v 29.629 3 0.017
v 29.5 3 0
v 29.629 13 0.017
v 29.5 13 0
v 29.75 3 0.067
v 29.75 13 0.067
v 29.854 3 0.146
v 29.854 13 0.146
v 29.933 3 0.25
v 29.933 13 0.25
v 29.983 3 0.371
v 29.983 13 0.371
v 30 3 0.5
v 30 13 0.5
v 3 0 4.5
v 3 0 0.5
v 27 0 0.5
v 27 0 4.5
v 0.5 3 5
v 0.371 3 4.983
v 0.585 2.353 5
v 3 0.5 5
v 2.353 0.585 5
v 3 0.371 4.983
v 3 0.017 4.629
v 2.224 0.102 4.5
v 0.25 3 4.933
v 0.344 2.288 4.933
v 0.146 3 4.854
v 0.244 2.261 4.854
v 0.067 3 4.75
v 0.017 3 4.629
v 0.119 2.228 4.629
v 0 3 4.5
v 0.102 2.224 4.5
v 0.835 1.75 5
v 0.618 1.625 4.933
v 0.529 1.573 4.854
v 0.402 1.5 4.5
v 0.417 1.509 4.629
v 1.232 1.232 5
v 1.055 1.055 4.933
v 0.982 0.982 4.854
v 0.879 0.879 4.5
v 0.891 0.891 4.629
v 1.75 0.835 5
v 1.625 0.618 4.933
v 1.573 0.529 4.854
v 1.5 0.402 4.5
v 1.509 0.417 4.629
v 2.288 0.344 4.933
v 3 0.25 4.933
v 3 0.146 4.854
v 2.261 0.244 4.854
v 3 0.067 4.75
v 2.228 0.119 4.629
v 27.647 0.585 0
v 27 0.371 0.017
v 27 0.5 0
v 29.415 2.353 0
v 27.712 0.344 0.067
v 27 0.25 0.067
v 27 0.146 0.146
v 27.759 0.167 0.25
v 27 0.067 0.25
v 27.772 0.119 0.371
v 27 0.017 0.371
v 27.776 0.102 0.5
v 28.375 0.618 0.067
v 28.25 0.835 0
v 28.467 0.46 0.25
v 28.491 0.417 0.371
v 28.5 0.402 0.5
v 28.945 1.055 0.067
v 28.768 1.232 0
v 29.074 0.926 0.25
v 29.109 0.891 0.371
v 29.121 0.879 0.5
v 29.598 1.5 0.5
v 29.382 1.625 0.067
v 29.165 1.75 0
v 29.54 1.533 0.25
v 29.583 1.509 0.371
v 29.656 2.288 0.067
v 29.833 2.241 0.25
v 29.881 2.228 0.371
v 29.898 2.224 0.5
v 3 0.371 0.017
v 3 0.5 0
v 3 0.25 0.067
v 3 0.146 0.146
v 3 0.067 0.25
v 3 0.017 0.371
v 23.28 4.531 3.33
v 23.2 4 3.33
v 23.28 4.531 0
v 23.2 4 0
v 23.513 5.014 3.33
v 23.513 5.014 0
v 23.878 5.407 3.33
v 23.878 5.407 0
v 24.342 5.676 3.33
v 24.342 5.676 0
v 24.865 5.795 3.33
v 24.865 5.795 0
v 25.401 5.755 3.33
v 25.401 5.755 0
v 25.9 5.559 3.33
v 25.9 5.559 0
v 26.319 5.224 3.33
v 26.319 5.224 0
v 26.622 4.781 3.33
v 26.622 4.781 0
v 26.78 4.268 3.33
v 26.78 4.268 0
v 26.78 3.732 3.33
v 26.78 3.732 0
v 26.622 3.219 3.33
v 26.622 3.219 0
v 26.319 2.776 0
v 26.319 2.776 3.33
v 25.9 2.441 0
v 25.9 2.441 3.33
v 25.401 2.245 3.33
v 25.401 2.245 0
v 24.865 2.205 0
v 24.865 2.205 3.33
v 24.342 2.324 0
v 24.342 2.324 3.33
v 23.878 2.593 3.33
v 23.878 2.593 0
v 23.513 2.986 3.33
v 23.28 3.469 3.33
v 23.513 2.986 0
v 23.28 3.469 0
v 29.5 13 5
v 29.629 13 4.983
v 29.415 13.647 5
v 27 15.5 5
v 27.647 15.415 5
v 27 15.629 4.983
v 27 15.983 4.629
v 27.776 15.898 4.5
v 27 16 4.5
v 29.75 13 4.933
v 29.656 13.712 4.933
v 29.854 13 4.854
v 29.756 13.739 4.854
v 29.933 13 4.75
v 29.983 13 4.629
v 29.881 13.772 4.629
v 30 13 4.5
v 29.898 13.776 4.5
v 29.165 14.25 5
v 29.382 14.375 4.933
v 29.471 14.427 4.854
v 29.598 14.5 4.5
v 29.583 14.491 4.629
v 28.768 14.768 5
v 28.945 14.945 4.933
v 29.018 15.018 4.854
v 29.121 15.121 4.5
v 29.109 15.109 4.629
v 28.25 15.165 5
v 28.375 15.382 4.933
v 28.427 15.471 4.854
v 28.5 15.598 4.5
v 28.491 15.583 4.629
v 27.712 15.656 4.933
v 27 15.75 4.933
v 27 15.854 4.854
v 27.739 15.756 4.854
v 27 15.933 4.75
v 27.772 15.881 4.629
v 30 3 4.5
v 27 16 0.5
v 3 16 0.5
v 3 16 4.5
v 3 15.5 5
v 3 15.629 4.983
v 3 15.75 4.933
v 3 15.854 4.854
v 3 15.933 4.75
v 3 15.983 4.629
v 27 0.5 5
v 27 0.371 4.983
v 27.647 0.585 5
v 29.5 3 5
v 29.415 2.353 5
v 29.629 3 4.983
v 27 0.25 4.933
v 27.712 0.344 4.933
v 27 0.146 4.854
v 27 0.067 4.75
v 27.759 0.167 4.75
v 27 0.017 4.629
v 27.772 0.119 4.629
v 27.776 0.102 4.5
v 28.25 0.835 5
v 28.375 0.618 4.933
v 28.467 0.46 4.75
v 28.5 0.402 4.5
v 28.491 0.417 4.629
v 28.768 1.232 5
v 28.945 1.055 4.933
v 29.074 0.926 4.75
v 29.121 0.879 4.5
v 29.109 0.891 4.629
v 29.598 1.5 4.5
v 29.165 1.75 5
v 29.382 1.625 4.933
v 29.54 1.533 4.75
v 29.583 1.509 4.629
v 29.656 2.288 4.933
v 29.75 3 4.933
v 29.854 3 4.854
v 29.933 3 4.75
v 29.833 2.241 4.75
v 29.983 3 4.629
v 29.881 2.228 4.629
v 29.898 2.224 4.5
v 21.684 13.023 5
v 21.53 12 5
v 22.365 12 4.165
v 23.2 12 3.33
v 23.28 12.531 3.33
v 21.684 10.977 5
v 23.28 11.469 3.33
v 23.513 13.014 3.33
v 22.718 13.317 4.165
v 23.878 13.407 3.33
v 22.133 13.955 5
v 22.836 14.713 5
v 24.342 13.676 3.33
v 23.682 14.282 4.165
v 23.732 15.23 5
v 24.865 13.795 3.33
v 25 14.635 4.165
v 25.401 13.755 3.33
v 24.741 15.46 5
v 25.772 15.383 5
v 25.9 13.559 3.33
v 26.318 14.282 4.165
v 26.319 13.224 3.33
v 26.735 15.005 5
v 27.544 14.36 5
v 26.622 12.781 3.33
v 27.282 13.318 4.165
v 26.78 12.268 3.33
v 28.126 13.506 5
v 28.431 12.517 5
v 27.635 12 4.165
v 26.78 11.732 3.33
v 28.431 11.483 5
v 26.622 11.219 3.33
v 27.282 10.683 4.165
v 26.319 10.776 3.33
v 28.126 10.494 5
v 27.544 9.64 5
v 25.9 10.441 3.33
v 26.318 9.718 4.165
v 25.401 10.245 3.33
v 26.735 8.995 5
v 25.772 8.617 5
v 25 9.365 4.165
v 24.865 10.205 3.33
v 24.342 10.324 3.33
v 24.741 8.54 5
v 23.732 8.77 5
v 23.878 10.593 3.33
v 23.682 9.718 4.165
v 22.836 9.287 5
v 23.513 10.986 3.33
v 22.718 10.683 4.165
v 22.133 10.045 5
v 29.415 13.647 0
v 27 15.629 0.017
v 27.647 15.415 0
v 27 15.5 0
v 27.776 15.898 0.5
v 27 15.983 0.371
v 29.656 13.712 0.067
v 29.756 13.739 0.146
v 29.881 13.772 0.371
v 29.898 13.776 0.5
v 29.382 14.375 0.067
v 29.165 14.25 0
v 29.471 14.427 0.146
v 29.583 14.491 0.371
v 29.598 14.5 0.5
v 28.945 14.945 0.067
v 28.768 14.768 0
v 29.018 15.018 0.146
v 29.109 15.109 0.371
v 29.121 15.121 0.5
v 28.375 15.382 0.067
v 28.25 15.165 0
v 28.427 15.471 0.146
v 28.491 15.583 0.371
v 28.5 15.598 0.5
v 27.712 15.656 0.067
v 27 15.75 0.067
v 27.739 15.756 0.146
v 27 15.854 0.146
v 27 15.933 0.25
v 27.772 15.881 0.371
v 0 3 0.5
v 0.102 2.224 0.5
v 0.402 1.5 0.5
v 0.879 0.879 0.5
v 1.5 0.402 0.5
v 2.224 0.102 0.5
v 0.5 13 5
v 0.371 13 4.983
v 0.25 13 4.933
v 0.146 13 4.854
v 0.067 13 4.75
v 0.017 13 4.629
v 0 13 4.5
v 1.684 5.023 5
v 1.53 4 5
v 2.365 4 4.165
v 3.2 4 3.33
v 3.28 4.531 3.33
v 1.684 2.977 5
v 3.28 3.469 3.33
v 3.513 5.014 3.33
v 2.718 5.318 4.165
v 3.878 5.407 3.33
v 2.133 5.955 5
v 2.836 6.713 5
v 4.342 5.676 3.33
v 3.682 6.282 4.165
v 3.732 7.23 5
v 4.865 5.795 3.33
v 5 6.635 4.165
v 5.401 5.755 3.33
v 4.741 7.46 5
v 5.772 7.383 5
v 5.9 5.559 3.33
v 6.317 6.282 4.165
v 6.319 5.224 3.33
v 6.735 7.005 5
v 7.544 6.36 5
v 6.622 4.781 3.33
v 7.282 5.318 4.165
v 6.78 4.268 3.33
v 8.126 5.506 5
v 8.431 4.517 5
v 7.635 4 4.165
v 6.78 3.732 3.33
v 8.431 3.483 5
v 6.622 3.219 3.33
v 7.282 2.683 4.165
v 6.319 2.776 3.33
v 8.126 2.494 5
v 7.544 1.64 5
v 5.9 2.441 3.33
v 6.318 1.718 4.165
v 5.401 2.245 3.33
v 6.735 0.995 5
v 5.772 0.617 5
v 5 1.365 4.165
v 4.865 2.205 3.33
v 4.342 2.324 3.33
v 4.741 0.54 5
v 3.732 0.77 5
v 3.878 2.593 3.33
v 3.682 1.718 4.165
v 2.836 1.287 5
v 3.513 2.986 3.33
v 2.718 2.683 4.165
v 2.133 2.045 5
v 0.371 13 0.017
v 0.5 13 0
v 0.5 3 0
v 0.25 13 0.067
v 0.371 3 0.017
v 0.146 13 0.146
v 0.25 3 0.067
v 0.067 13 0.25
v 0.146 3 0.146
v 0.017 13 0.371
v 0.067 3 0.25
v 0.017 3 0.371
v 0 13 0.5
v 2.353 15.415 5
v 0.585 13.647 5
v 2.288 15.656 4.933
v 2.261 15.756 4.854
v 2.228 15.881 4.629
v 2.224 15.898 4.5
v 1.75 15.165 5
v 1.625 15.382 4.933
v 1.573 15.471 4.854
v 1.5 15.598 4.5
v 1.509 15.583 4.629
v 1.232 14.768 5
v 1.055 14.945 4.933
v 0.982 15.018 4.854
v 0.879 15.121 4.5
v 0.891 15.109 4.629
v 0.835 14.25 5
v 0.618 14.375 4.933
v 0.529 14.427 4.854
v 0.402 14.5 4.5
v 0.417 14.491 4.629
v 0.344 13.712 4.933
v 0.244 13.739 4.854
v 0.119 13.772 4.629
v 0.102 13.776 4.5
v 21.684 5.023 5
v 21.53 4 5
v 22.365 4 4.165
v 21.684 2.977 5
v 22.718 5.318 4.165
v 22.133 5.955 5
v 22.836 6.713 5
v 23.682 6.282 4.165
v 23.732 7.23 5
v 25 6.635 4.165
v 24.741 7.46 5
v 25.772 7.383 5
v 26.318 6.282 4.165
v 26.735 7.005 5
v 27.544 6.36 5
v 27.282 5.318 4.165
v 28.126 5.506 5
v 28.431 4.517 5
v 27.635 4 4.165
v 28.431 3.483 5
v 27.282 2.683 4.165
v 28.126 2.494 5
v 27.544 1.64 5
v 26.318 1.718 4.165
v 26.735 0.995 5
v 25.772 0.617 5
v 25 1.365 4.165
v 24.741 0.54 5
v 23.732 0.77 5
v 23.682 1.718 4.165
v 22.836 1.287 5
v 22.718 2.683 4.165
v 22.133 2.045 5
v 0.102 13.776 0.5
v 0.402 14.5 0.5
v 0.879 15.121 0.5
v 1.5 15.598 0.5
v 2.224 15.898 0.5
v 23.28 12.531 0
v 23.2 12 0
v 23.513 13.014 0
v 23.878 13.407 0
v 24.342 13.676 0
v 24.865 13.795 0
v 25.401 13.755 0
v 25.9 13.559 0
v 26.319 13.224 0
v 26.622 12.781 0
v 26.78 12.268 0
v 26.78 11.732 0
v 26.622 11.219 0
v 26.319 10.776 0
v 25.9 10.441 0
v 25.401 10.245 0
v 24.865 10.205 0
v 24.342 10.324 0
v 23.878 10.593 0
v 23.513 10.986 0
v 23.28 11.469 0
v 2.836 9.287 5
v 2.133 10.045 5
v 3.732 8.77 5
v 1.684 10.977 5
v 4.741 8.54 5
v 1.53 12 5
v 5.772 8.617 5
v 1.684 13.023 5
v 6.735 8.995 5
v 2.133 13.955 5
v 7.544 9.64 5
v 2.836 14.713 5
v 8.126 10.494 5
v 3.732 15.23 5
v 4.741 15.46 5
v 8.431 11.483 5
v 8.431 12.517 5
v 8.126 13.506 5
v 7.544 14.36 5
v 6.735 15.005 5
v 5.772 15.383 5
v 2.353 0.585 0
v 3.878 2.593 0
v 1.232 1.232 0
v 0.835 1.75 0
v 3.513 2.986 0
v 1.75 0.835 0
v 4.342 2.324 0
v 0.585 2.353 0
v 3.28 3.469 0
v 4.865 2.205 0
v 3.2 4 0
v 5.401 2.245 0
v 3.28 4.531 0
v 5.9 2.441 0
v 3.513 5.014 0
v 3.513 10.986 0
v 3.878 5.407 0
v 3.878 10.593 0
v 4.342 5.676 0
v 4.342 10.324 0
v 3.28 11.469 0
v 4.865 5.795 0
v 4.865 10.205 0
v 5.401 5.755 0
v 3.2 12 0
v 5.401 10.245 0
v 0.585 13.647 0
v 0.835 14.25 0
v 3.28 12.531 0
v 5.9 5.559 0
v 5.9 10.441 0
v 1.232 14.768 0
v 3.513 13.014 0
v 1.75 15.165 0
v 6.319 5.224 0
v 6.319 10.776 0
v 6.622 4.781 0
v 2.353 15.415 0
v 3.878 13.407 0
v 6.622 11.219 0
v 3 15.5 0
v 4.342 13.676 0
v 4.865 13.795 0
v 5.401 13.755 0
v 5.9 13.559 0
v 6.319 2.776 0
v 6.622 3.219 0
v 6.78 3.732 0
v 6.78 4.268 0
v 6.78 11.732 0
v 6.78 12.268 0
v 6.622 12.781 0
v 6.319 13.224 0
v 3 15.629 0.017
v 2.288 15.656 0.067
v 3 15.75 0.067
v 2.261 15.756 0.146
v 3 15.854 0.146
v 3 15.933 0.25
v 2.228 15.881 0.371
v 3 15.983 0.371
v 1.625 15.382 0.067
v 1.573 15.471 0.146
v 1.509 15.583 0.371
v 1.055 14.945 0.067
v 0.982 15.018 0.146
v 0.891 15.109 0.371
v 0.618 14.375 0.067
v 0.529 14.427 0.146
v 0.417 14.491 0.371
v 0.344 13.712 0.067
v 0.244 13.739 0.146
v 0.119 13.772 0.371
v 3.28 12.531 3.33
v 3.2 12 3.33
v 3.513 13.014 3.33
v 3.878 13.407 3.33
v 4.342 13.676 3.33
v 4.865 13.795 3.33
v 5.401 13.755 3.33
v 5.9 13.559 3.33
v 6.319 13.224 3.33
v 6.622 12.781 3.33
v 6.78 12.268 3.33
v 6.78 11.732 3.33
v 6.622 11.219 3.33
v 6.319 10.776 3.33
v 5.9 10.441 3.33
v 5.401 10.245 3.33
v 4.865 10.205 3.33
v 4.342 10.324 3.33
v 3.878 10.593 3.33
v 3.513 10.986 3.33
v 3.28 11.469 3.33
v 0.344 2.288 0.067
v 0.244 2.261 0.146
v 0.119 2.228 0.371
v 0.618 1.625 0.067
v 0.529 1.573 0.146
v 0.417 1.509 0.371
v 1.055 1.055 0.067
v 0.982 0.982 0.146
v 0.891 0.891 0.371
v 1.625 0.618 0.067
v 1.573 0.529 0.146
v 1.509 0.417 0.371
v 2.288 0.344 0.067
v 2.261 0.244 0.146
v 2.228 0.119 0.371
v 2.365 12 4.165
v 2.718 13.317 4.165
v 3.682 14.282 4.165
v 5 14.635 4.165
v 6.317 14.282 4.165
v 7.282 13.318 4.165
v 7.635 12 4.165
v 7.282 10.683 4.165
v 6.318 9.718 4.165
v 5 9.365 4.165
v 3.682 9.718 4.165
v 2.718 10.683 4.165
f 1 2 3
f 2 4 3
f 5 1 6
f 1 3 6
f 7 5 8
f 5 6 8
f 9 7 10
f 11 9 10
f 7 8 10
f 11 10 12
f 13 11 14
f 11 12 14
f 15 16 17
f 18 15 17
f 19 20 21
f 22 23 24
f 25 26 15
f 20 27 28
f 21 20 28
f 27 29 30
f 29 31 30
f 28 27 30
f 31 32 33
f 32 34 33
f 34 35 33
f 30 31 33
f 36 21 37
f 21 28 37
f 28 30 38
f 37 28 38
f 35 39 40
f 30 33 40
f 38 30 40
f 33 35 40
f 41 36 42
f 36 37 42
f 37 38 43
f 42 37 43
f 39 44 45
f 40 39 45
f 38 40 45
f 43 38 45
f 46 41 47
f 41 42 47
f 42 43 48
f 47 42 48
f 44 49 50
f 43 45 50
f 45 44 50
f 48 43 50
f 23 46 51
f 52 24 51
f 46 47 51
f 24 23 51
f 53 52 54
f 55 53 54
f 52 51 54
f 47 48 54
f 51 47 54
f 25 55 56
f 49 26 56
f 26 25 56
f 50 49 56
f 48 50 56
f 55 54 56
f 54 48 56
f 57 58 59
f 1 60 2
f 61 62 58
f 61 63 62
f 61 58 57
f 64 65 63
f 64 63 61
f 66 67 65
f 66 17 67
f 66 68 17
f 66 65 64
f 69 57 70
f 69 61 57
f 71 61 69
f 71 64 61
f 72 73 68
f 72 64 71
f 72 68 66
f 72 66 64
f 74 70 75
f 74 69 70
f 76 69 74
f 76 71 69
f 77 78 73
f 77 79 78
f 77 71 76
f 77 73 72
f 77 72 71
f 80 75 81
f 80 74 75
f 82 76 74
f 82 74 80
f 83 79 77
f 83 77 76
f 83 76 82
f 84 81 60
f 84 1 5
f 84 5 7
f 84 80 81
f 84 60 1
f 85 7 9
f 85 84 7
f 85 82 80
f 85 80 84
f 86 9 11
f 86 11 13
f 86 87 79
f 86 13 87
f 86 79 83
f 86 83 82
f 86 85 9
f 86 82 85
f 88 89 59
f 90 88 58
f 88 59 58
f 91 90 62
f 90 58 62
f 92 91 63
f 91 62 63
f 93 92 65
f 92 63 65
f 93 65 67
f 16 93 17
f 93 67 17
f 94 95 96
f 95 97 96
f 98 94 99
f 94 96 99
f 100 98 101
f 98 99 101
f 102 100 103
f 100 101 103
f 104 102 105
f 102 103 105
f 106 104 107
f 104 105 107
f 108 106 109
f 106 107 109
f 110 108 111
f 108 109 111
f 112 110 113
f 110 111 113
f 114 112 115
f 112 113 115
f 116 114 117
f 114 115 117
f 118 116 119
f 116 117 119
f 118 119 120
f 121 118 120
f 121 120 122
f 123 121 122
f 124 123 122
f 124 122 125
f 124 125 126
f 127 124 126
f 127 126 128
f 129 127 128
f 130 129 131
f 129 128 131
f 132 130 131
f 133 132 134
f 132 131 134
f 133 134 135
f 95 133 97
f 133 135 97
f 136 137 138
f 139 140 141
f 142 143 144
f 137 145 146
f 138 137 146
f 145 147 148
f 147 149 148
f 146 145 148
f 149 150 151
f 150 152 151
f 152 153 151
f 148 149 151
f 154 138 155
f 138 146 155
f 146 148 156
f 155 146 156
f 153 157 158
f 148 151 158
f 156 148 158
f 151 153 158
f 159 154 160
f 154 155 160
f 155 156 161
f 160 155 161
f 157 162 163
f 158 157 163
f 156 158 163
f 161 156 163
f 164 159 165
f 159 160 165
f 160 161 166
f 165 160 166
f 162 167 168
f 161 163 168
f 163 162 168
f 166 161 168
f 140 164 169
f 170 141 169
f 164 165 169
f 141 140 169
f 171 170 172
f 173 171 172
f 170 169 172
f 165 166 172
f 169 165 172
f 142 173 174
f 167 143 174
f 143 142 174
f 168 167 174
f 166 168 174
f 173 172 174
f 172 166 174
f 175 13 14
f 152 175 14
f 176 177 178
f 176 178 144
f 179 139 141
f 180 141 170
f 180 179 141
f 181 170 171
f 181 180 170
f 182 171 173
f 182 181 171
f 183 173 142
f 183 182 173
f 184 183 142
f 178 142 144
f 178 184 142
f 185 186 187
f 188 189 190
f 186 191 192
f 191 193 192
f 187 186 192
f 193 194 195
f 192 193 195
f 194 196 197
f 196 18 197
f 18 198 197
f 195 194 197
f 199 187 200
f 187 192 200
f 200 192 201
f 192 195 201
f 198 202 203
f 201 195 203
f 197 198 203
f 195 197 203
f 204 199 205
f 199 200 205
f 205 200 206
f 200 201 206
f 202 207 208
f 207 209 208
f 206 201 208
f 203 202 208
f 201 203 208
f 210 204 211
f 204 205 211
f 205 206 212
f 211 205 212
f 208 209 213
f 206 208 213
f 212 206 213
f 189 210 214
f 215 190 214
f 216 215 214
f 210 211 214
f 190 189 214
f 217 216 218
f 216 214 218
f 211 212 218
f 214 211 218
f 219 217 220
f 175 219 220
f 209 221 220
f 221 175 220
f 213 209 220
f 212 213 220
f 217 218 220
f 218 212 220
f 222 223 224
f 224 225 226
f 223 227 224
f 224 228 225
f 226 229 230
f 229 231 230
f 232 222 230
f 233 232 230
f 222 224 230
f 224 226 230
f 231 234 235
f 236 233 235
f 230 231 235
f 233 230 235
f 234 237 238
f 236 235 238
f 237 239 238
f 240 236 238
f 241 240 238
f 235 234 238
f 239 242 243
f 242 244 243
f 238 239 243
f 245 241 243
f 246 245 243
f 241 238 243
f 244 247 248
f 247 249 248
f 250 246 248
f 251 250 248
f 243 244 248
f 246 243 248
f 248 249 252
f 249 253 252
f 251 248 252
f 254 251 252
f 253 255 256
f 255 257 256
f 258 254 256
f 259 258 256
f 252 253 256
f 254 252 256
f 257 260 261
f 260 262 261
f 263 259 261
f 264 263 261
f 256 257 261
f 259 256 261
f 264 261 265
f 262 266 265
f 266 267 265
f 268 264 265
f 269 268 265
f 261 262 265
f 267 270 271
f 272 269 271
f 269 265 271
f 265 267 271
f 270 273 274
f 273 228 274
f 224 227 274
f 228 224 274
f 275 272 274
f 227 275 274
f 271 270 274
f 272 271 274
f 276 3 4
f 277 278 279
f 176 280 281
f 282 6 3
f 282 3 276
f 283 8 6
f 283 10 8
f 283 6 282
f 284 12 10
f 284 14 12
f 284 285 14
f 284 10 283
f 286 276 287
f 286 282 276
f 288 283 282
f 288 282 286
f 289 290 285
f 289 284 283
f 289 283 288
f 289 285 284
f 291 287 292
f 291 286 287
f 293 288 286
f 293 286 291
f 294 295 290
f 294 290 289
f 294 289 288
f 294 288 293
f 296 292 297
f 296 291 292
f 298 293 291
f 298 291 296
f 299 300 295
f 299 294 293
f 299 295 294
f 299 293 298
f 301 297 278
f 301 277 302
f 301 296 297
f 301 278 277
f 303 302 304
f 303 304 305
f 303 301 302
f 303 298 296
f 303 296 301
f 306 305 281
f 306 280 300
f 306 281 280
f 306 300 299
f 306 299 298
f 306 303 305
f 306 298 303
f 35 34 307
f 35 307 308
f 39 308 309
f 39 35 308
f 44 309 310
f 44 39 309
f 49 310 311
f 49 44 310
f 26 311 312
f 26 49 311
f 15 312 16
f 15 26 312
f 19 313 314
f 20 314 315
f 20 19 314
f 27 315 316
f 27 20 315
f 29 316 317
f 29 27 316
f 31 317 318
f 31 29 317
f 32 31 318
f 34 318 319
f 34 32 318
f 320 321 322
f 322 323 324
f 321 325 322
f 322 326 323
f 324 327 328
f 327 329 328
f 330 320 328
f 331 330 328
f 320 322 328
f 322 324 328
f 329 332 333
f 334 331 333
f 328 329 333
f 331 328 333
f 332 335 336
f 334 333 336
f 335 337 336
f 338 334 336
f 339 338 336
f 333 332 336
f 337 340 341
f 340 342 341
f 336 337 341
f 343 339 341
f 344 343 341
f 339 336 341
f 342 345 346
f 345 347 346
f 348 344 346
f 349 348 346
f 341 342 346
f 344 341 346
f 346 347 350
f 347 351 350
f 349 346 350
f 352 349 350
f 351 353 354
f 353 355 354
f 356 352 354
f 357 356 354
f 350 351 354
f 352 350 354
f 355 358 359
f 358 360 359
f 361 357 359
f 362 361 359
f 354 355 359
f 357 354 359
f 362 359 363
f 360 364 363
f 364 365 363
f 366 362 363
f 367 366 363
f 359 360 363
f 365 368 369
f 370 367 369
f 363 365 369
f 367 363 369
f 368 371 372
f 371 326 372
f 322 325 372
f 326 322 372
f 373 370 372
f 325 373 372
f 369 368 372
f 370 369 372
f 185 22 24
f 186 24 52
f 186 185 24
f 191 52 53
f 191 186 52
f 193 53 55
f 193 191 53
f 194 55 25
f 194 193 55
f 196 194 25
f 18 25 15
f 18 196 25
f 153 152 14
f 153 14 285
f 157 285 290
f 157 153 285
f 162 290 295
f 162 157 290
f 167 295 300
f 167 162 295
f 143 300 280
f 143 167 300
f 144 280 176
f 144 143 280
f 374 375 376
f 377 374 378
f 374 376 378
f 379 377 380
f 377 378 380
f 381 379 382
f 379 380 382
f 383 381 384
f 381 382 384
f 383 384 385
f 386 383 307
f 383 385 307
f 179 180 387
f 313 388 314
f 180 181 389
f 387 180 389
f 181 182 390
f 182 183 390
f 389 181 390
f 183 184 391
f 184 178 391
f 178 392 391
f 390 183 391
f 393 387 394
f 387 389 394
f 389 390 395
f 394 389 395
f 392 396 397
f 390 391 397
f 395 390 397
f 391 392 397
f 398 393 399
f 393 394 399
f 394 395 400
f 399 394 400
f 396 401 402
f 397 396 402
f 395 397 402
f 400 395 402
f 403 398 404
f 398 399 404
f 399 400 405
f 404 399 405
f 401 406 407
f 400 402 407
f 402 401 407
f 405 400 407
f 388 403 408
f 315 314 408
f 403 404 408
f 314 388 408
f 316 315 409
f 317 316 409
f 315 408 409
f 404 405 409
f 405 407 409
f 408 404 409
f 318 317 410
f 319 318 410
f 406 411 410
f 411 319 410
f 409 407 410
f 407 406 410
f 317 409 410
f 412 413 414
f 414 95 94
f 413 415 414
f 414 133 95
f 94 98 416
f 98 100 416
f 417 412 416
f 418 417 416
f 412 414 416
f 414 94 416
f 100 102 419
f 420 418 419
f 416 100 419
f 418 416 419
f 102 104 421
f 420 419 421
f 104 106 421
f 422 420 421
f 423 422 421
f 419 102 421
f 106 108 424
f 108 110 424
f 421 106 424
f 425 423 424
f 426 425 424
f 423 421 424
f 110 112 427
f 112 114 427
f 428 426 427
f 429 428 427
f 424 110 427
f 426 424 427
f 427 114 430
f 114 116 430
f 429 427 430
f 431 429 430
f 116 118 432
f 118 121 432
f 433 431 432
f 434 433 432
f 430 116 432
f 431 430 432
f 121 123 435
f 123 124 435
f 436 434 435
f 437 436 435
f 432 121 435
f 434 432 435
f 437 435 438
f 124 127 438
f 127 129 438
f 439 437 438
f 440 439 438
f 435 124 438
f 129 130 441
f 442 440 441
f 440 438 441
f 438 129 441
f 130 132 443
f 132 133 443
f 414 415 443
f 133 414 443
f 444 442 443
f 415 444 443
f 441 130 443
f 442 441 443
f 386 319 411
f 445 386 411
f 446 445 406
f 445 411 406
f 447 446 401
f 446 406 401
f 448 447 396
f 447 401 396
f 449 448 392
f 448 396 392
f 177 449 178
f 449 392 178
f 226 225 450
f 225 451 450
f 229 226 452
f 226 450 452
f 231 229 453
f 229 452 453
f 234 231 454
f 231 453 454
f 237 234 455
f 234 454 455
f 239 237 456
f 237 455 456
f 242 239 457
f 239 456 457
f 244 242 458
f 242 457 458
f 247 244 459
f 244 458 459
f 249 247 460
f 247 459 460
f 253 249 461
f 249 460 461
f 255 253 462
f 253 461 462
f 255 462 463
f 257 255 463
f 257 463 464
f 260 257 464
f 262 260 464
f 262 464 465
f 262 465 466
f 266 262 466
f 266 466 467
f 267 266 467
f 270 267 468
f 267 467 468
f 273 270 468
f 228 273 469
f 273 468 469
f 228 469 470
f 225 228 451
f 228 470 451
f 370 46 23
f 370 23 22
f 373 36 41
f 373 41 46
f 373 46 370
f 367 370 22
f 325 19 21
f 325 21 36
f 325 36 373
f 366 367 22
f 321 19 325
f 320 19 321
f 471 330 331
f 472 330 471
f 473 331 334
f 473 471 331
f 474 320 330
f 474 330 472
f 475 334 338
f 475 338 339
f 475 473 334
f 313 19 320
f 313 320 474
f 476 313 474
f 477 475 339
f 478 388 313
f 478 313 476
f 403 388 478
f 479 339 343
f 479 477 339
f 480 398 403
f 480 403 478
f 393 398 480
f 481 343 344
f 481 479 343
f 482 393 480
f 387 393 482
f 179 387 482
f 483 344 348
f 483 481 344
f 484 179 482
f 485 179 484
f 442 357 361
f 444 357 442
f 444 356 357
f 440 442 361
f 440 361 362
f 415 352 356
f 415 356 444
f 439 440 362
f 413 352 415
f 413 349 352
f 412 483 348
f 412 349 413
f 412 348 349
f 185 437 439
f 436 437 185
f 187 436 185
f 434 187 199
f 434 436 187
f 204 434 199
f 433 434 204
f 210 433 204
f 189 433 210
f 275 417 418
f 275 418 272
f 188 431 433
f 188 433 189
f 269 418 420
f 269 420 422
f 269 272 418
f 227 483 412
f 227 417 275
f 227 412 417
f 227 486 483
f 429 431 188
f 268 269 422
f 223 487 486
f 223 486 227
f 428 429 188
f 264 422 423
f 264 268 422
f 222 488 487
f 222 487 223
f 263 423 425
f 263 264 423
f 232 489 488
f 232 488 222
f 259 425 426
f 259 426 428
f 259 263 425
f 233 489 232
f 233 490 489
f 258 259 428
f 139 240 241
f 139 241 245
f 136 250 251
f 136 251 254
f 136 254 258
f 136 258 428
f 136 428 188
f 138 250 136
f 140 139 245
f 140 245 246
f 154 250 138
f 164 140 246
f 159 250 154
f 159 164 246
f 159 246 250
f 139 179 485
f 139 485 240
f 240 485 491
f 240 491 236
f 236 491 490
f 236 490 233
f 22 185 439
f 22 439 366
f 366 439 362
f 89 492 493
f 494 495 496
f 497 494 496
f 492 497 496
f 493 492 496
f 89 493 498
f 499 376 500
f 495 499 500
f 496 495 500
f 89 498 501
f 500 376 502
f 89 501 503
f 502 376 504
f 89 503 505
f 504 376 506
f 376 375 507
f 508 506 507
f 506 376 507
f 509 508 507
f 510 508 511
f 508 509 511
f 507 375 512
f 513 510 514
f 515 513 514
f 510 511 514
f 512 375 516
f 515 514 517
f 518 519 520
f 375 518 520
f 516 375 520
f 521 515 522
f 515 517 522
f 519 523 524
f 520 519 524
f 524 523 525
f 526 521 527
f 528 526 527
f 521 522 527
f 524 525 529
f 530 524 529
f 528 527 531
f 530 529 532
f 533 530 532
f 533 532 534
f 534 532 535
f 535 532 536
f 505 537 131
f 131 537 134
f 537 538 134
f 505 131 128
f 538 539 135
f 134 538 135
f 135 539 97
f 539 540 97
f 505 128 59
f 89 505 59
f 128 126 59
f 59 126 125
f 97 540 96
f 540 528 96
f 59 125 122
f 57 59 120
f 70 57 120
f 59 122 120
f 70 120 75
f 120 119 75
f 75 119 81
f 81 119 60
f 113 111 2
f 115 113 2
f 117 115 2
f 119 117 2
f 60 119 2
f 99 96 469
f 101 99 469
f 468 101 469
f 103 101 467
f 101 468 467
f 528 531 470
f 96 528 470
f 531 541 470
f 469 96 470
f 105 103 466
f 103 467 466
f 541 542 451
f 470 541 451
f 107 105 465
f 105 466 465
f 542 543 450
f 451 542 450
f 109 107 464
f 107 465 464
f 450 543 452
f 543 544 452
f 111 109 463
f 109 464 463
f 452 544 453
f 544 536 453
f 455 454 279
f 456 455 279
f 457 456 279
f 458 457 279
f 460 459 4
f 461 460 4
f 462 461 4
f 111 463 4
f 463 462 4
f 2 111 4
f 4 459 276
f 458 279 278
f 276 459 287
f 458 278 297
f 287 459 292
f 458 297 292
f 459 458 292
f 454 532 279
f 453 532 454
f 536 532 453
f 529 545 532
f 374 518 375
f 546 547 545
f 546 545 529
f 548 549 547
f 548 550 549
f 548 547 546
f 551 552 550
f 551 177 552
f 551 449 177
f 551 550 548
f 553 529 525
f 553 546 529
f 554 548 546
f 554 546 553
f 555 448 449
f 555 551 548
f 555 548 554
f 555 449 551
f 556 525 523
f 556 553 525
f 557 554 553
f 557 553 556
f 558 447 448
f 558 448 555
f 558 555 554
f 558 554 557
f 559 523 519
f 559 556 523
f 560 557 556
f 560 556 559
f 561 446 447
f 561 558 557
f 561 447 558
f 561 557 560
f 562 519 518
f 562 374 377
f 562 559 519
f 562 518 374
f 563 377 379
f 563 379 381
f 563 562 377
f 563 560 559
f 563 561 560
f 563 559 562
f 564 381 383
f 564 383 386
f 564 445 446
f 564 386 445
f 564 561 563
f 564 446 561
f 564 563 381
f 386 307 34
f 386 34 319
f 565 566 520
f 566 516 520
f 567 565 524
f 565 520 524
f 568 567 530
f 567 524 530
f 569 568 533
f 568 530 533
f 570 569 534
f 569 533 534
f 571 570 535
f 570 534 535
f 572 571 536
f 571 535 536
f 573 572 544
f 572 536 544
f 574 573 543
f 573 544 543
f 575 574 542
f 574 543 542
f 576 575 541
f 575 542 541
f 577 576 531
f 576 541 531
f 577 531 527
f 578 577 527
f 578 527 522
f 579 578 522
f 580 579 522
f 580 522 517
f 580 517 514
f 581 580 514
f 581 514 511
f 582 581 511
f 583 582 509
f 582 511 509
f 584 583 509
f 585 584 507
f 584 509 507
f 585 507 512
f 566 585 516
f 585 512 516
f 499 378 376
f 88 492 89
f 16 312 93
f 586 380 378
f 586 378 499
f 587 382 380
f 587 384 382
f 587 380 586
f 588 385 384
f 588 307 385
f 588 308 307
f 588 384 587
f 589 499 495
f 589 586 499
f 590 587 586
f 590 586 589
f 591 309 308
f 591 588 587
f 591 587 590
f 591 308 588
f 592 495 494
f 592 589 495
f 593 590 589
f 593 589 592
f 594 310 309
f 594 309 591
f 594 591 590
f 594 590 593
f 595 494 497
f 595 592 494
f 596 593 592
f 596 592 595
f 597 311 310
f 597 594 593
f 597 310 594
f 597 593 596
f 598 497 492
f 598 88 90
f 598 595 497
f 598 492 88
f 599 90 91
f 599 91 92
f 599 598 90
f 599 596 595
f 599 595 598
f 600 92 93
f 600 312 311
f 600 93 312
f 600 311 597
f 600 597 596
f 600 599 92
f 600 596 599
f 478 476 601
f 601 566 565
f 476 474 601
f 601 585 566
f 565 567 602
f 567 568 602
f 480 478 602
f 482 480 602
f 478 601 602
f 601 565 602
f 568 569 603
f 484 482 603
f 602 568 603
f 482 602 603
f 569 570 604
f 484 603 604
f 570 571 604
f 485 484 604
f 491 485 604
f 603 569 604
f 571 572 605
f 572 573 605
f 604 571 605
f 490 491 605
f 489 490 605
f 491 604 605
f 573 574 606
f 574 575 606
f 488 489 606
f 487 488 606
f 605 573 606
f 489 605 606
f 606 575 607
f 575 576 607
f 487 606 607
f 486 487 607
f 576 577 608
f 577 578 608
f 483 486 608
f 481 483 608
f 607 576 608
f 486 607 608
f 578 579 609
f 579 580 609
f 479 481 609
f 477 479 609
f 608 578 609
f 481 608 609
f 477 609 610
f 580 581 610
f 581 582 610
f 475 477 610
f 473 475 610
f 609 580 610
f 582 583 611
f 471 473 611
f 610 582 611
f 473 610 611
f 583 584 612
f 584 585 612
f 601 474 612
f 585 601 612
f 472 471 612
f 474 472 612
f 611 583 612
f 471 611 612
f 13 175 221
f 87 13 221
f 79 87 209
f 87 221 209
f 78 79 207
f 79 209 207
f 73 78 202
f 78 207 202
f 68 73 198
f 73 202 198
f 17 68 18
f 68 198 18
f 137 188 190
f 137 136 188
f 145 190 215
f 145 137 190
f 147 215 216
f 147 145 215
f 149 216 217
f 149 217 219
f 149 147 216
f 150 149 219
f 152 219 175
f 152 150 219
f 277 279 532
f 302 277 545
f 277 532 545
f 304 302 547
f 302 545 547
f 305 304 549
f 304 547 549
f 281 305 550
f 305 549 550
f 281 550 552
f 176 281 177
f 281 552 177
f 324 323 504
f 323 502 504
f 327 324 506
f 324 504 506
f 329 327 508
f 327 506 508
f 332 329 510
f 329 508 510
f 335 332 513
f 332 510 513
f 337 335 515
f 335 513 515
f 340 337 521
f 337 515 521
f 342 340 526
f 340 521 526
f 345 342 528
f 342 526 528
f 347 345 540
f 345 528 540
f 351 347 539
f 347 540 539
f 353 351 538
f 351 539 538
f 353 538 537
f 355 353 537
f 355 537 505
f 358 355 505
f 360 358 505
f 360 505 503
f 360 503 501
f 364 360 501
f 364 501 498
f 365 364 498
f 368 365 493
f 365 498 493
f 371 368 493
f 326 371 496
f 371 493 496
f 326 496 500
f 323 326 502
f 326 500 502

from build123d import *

# Parameters (mm, degrees)
SKETCH1_W                                            = 30
SKETCH1_H                                            = 16
BOSS_EXTRUDE1_DEPTH                                  = 5
CSK_FOR_M3_HEX_SOCKET_COUNTERSUNK_HEAD_S_D           = 3.6
CSK_FOR_M3_HEX_SOCKET_COUNTERSUNK_HEAD_S_CSINK_D     = 6.94
CSK_FOR_M3_HEX_SOCKET_COUNTERSUNK_HEAD_S_CSINK_ANGLE = 90
FILLET1_R                                            = 3
FILLET2_R                                            = 0.5


with BuildPart() as part:
    # Sketch1 → Boss-Extrude1 (new body)
    with BuildSketch(Plane.XY):
        with Locations((15, 8)):
            Rectangle(SKETCH1_W, SKETCH1_H)
    extrude(amount=BOSS_EXTRUDE1_DEPTH)

    # CSK for M3 Hex Socket Countersunk Head Screw1 (through all)
    with Locations(Plane.XY.offset(5)):
        with Locations((5, 12), (25, 12), (25, 4), (5, 4)):
            CounterSinkHole(CSK_FOR_M3_HEX_SOCKET_COUNTERSUNK_HEAD_S_D / 2, CSK_FOR_M3_HEX_SOCKET_COUNTERSUNK_HEAD_S_CSINK_D / 2, counter_sink_angle=CSK_FOR_M3_HEX_SOCKET_COUNTERSUNK_HEAD_S_CSINK_ANGLE)

    # Fillet1
    fillet1_edges = [part.edges().sort_by_distance(p)[0] for p in [
        (0, 16, 2.5),
        (30, 16, 2.5),
        (30, 0, 2.5),
        (0, 0, 2.5),
    ]]
    fillet(fillet1_edges, radius=FILLET1_R)

    # Fillet2
    fillet2_edges = [part.edges().sort_by_distance(p)[0] for p in [
        (30, 8, 0),
        (30, 8, 5),
        (0, 8, 0),
        (15, 16, 0),
        (15, 0, 0),
        (0.878679656, 15.121320344, 0),
        (0.878679656, 0.878679656, 0),
        (29.121320344, 15.121320344, 0),
        (29.121320344, 0.878679656, 0),
        (15, 0, 5),
        (0, 8, 5),
        (15, 16, 5),
        (0.878679656, 15.121320344, 5),
        (0.878679656, 0.878679656, 5),
        (29.121320344, 15.121320344, 5),
        (29.121320344, 0.878679656, 5),
    ]]
    fillet(fillet2_edges, radius=FILLET2_R)


solid = part.part
